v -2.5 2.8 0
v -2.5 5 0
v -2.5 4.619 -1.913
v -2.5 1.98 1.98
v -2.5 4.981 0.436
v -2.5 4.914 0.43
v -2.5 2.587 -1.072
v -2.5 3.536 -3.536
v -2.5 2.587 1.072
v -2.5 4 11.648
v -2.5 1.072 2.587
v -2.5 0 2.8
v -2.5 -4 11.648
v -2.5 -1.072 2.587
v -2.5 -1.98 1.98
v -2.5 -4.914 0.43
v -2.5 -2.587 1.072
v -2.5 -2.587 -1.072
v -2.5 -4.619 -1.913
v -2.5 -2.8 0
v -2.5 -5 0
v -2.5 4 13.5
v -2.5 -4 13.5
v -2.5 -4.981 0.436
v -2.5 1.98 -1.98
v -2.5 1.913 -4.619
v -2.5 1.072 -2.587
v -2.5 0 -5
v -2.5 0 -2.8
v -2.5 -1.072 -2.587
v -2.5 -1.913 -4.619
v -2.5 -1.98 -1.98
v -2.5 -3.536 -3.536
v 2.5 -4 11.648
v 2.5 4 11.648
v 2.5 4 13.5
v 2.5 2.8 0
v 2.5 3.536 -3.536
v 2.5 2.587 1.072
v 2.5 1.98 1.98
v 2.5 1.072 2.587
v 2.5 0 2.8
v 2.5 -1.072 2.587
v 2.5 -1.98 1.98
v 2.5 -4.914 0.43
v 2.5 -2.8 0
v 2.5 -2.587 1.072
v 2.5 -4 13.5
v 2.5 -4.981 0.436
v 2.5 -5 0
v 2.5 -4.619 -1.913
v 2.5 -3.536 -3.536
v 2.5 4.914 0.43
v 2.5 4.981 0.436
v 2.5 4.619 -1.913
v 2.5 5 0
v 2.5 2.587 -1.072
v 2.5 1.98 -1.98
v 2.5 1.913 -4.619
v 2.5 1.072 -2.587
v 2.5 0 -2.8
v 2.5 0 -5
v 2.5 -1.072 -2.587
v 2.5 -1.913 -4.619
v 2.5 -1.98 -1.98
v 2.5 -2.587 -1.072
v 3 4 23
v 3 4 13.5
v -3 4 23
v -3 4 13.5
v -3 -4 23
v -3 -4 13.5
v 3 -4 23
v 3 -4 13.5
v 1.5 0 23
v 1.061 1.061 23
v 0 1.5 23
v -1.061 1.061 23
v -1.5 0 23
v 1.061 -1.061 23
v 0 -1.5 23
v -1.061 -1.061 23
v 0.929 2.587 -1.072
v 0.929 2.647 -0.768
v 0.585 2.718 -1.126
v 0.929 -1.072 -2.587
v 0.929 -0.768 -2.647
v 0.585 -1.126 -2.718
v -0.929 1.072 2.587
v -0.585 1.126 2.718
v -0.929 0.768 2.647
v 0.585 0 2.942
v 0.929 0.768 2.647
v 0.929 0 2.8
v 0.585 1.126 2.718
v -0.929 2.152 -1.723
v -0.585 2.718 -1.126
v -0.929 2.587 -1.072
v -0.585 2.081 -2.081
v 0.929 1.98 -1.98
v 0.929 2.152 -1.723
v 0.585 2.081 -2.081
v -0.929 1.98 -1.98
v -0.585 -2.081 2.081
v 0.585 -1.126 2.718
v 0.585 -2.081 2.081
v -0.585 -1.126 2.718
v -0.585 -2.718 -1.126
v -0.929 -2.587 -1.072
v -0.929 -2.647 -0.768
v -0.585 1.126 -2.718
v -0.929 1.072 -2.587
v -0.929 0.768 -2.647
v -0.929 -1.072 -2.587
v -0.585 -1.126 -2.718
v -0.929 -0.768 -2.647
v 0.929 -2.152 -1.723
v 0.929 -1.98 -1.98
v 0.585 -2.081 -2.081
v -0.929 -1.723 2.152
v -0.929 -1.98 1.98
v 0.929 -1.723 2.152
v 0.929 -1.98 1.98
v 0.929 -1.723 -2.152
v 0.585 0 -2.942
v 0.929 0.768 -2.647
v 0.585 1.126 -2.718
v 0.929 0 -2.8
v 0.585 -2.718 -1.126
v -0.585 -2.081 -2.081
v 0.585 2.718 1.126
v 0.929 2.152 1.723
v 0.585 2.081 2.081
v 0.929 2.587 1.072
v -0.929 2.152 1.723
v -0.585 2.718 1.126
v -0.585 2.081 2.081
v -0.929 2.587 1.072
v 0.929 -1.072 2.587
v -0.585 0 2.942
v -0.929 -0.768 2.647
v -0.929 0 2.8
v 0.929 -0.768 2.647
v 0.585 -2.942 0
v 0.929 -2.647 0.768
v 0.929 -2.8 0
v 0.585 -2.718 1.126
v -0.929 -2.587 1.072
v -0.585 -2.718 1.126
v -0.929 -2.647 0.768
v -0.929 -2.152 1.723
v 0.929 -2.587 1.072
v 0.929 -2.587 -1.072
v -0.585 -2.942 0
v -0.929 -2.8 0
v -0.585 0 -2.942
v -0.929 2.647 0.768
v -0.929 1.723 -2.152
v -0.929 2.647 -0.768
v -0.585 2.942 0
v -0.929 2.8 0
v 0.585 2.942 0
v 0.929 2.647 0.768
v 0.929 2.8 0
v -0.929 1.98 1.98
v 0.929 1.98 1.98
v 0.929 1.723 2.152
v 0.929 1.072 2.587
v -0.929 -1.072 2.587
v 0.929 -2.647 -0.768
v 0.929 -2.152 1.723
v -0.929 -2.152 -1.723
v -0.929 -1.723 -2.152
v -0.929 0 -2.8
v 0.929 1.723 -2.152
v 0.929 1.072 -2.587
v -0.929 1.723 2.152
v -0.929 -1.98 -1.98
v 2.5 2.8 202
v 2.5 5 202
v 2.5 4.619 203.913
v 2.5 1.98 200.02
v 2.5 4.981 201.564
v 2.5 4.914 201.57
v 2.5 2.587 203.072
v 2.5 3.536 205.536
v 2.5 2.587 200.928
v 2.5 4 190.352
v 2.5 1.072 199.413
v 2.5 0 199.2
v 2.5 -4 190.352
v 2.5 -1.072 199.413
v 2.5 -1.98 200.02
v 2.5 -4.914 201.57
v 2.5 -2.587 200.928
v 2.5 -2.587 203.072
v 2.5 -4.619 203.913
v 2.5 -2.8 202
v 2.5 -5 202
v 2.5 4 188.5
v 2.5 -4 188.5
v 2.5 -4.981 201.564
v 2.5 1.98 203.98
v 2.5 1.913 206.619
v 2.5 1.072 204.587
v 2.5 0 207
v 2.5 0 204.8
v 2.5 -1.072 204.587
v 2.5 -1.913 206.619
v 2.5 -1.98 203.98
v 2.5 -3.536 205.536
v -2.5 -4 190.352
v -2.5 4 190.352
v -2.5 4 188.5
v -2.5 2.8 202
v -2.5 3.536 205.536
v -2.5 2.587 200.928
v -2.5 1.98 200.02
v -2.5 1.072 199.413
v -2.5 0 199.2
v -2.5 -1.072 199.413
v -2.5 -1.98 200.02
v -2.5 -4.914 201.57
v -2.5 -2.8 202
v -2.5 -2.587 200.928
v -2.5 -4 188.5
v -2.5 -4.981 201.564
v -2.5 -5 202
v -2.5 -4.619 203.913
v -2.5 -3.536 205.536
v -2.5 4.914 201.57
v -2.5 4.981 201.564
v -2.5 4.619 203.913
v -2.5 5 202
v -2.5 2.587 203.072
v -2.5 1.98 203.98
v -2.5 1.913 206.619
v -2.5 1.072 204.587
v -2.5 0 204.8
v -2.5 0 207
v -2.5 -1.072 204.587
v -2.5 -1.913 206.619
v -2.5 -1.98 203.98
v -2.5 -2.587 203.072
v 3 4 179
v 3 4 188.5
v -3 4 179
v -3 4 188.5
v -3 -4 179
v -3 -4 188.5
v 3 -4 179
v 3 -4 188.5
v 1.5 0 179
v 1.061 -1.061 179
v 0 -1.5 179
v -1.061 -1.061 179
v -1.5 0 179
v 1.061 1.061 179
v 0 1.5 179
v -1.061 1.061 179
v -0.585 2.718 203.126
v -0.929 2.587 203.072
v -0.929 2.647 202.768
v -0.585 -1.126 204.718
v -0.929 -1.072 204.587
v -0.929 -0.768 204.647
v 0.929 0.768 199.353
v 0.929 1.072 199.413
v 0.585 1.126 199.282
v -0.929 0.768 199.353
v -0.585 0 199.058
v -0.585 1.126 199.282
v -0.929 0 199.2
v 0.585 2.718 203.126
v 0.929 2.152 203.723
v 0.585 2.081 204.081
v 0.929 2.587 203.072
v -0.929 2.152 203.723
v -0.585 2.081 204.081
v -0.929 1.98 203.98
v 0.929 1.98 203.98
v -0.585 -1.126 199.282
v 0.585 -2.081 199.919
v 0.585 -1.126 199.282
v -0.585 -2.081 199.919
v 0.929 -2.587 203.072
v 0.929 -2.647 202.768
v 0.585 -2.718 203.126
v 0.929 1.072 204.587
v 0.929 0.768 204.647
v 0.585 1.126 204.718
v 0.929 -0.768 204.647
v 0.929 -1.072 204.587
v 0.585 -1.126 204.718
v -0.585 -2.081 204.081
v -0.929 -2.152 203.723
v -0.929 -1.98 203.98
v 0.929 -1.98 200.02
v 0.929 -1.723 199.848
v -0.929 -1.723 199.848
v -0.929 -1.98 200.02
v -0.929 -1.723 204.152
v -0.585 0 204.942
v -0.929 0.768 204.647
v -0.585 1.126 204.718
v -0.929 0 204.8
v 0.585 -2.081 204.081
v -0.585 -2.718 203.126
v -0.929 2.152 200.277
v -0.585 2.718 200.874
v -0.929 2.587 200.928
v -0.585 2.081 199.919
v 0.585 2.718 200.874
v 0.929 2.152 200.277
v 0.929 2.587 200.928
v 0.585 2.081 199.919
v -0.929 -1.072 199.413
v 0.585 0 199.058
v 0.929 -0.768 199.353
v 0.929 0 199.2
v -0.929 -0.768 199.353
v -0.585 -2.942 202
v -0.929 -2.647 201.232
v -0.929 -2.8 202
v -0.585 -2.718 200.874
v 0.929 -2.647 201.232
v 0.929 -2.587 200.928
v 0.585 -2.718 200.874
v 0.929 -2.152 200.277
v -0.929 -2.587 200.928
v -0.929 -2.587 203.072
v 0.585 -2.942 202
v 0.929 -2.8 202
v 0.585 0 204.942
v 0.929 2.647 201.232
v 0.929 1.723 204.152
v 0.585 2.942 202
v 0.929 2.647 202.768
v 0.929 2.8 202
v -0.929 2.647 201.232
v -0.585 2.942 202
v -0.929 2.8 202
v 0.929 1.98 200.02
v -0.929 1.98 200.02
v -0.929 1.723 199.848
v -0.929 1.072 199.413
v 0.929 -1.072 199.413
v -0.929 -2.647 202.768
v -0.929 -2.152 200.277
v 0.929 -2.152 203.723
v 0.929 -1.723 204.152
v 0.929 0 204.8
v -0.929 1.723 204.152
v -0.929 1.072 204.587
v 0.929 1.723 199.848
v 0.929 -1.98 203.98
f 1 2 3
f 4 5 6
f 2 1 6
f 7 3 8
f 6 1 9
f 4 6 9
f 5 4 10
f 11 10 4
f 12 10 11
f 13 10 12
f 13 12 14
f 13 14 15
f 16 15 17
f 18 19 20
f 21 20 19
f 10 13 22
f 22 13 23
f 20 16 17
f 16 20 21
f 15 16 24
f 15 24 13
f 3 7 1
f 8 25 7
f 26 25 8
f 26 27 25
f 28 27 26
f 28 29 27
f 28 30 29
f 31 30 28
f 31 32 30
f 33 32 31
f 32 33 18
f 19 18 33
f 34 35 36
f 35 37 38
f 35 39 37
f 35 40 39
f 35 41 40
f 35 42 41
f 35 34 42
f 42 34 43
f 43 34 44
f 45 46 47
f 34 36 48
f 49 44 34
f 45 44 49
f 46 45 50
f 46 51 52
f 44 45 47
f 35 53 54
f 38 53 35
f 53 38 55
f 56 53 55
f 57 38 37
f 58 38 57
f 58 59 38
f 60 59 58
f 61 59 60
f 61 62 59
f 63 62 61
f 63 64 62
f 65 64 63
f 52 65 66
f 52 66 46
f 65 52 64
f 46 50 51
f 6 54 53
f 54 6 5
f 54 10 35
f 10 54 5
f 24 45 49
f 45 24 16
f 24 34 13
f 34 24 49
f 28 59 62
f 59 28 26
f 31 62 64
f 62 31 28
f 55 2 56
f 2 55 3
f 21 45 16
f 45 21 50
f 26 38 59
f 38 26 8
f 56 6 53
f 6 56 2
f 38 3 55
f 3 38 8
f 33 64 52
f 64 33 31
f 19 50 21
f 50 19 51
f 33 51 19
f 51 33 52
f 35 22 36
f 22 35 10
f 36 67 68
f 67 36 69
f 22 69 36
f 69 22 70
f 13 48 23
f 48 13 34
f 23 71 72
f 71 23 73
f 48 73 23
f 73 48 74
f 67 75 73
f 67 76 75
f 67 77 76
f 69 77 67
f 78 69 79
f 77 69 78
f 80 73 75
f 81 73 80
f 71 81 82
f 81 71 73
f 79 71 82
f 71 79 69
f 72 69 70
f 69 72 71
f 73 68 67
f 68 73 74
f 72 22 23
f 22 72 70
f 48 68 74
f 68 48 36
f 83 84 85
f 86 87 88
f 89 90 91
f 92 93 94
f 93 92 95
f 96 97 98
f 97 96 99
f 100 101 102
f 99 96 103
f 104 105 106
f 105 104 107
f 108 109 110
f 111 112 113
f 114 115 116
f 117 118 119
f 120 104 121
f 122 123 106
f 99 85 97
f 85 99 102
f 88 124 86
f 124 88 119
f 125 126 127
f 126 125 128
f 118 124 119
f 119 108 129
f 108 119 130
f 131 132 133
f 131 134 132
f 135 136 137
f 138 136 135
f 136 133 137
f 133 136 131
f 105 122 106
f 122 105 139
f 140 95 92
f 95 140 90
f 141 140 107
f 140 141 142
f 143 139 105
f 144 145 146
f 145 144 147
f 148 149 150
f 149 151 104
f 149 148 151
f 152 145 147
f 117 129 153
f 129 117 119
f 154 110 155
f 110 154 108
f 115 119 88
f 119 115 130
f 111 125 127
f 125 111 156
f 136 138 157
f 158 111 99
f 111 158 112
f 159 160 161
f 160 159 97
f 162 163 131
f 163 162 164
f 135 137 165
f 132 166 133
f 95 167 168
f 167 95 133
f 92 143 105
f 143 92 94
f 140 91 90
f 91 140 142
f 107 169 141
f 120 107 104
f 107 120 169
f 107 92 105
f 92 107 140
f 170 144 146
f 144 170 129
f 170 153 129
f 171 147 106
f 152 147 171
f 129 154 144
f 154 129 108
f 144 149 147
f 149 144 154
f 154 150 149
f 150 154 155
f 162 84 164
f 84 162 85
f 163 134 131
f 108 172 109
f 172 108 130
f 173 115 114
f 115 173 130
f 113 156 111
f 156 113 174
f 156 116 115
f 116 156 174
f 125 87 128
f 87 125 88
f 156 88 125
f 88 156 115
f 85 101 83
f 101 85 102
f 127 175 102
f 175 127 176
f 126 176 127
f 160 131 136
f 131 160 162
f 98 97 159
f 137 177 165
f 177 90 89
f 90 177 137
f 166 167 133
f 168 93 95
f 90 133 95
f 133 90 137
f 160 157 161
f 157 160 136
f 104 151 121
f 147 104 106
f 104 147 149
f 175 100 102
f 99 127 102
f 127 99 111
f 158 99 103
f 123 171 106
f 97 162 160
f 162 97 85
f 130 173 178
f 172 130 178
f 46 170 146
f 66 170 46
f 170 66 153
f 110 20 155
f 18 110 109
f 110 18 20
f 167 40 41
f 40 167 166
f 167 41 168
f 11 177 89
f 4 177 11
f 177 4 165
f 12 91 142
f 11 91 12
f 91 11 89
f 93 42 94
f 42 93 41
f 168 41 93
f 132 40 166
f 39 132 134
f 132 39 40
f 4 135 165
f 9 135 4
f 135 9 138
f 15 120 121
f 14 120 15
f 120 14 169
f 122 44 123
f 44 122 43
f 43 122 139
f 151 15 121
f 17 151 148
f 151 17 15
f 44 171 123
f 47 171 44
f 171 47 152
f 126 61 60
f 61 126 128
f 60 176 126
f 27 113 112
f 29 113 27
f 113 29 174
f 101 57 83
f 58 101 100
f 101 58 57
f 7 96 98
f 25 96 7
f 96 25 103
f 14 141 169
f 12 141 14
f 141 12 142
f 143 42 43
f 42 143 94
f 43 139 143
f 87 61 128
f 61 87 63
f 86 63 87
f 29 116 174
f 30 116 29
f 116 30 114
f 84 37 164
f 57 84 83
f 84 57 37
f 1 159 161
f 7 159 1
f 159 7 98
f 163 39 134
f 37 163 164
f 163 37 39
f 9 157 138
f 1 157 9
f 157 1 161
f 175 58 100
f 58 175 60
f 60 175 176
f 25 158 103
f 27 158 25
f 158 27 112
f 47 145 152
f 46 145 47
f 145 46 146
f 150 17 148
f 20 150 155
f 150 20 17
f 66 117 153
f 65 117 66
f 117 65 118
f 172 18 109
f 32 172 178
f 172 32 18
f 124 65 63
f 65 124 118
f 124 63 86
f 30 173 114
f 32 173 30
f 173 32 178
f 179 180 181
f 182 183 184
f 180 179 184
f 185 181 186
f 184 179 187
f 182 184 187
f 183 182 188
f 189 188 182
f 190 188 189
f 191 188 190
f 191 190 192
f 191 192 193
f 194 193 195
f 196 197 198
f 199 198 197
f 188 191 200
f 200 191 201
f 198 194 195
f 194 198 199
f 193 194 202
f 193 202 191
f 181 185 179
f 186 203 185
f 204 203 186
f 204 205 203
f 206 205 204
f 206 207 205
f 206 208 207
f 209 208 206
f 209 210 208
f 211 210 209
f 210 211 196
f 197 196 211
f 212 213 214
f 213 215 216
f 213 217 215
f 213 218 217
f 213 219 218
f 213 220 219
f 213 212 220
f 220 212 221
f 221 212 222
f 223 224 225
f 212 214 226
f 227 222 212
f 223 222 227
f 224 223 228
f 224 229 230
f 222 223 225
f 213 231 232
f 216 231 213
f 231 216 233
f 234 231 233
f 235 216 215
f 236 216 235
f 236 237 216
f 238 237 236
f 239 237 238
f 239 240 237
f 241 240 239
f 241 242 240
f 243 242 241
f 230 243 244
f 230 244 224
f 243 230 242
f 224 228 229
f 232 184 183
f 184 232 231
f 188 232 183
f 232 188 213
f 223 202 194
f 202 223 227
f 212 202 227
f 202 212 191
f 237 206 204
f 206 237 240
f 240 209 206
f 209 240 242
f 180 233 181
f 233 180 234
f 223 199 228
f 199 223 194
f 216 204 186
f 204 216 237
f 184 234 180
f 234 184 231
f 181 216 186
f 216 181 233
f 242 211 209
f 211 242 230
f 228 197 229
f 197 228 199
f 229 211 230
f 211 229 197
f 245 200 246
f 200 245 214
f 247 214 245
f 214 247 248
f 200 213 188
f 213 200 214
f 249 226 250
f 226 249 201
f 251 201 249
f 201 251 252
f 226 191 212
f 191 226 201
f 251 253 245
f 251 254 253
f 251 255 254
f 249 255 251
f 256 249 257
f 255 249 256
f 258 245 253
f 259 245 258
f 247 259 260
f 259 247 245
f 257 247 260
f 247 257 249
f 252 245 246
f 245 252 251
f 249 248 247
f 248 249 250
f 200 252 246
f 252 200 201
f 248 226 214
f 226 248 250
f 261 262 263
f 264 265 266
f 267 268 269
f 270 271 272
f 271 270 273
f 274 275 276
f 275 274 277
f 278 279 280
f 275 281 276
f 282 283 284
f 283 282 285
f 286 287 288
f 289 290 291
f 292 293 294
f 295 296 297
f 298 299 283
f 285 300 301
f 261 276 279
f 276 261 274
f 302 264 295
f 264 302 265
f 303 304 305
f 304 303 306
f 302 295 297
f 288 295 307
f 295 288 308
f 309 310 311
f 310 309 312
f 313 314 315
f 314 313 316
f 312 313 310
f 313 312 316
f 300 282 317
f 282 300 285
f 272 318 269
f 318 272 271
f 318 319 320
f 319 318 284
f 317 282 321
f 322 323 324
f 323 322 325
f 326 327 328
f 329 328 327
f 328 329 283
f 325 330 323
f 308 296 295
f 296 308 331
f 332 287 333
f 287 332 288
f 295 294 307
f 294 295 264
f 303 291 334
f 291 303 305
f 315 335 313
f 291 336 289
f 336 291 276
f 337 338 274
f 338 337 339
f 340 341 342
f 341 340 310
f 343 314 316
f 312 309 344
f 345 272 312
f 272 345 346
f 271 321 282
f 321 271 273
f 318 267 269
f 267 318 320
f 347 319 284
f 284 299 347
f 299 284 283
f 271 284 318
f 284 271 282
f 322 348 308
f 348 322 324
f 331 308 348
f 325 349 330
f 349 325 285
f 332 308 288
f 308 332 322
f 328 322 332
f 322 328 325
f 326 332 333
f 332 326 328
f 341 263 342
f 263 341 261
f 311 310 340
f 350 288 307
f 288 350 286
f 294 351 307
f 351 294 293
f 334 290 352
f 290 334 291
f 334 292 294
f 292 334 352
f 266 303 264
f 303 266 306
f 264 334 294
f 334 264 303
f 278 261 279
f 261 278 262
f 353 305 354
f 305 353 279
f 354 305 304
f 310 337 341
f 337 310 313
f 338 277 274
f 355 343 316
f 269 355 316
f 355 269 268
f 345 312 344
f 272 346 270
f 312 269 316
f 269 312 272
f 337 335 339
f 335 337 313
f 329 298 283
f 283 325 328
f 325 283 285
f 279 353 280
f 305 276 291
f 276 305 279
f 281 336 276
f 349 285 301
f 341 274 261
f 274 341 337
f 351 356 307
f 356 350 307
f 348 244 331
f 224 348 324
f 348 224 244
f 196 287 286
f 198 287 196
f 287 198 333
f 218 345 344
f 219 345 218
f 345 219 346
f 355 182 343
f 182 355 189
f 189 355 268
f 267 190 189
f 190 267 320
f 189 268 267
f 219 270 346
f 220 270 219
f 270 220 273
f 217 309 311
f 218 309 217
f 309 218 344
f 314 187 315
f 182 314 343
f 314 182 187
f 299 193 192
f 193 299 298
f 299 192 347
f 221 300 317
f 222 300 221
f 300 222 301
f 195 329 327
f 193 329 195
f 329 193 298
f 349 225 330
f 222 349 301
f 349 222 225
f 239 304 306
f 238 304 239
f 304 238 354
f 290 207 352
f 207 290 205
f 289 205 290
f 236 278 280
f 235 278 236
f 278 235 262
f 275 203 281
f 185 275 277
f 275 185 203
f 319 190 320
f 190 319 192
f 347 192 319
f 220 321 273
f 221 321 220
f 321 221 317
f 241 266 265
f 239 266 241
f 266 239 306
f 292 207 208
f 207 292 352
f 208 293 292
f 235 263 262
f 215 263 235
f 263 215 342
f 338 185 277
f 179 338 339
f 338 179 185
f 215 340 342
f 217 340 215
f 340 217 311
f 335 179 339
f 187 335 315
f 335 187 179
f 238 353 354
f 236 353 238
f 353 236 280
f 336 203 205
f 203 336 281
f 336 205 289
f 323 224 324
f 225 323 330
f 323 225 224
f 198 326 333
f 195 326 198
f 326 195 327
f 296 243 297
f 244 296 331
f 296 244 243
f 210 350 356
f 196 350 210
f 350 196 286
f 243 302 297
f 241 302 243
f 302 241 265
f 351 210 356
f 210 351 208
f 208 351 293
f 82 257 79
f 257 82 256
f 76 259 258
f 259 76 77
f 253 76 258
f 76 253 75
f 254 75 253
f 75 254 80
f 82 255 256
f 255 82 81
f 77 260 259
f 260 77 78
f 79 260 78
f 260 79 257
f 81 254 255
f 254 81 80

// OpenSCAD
// file: ../machined_parts/diagonal_rod.scad
include <../configuration.scad>

echo("diagonal rod length",diagonal_rod_length);
diagonal_rod();

module diagonal_rod() {
	color("dimgray") translate([0,0,diagonal_rod_length/2]) cylinder(h = diagonal_rod_length, r = diagonal_rod_diameter/2, center = true, $fn = 8);
}
// file: ../standard_parts/ball_link.scad
include <../configuration.scad>;

$fn=16;

ball_link();

module ball_link() {
	color("DarkSlateGray") difference() {
		union() {
			cylinder(h = 5, r = 5, center = true);
			translate([(23-9)/2,0,0]) cube([23-9,8,5],true);
			translate([23-(9.5)/2,0,0]) cube([9.5,8,6],true);
			for(m = [0,1]) mirror([ 0, m, 0 ]) rotate([0,0,-5]) translate([0,0,-2.5]) cube([12,5,5],false);
		}
		sphere(r=3,center = true);
		cylinder(h = 10, r = 2.8, center = true);
		//sphere(r= 4);
	}
}
// file: ../configuration.scad
$fa = 2;
$fs = 0.5;

motor_end_height=44;
idler_end_height=28;
carriage_height=13.8;
platform_thickness=10;
platform_fix_dia=28;
platform_dia=38;

bearing_diameter=16;
bearing_dia_clearence=0.5;
bearing_free_dia_clearence=0.8;

hotend_diameter=16.4;
hotend_groove_dia=12;

// Frames

// Places mounting holes for the controller
// 33 = RAMPS 1.3 (Power outputs: Extruder, Bed, Fan)
// 34 = RAMPS 1.3 (Power outputs: Extruder0, Extruder1, Bed)
// 35 = RAMPS 1.3 (Power outputs: Extruder, Fan, Fan)
// 70 = Megatronics
// 701 = Megatronics 2.0

motherboard=35;

frame_thickness=8;

// Distance from motor axle to idler axle
// Calculated regarding length of the HTD3M closed belt 
belt_tooth=354;
spacing = round(((belt_tooth*3) - 3.14159 * 24.83) / 2);

rod_length=spacing+55;
rod_diameter=8;
//platform_hinge_offset=25;
//carriage_hinge_offset=17;

printbed_diameter=170;	//printable aera
printbed_thickness=4;		// used for rendering and approximating build volume


//corner_radius=12;
//frame_radius=(tower_radius-rod_diameter/2-corner_radius)/cos(30);

ball_link_distance=40;//55;
ball_offset=6.5;
ball_distance=ball_link_distance-2*ball_offset;
ball_angle=25;

// Delta Settings

delta_smooth_rod_offset=139.5;//140 - 152 floor(printbed_diameter/(2*sin(ball_angle))-printbed_diameter/2+delta_effector_offset+delta_carriage_offset)
delta_effector_offset=18;
delta_carriage_offset=18;
delta_diagonal_rod=ceil(max(printbed_diameter/2+delta_smooth_rod_offset-delta_effector_offset-delta_carriage_offset,printbed_diameter/(2*sin(ball_angle))));
//|-> 202
delta_radius=(delta_smooth_rod_offset-delta_effector_offset-delta_carriage_offset);

diagonal_rod_length=delta_diagonal_rod-2*8;//165
diagonal_rod_diameter=3;
diagonal_rod_length_lost=(printbed_diameter/(2*sin(ball_angle)))-(printbed_diameter/2+delta_smooth_rod_offset-delta_effector_offset-delta_carriage_offset);

diagonal_rod_angle=acos(delta_radius/delta_diagonal_rod);

echo_result=true;

carriage_altitude=sqrt(pow(delta_diagonal_rod,2)-pow(delta_radius,2));



if(echo_result) {
	echo("printbed_diameter",printbed_diameter);
	echo("delta_diagonal_rod",delta_diagonal_rod);
	echo("diagonal_rod_length",diagonal_rod_length);
	echo("delta_effector_offset",delta_effector_offset);
	echo("delta_carriage_offset",delta_carriage_offset);
	echo("delta_radius",delta_radius);
	echo("diagonal_rod_angle",diagonal_rod_angle);
	echo("carriage_altitude",carriage_altitude);
	echo("diagonal_rod_length_lost",diagonal_rod_length_lost);
	echo("delta_smooth_rod_offset_optimum",printbed_diameter/(2*sin(ball_angle))-printbed_diameter/2+delta_effector_offset+delta_carriage_offset);
	echo("rod_length",rod_length);
}
// main file
include <../configuration.scad>;
use <../standard_parts/ball_link.scad>;
use <../machined_parts/diagonal_rod.scad>;

module arm() {
	rotate([0,-90,0]) ball_link();
	translate([0,0,delta_diagonal_rod]) rotate([0,90,0]) ball_link();
	translate([0,0,(delta_diagonal_rod-diagonal_rod_length)/2]) diagonal_rod();
}

arm();
